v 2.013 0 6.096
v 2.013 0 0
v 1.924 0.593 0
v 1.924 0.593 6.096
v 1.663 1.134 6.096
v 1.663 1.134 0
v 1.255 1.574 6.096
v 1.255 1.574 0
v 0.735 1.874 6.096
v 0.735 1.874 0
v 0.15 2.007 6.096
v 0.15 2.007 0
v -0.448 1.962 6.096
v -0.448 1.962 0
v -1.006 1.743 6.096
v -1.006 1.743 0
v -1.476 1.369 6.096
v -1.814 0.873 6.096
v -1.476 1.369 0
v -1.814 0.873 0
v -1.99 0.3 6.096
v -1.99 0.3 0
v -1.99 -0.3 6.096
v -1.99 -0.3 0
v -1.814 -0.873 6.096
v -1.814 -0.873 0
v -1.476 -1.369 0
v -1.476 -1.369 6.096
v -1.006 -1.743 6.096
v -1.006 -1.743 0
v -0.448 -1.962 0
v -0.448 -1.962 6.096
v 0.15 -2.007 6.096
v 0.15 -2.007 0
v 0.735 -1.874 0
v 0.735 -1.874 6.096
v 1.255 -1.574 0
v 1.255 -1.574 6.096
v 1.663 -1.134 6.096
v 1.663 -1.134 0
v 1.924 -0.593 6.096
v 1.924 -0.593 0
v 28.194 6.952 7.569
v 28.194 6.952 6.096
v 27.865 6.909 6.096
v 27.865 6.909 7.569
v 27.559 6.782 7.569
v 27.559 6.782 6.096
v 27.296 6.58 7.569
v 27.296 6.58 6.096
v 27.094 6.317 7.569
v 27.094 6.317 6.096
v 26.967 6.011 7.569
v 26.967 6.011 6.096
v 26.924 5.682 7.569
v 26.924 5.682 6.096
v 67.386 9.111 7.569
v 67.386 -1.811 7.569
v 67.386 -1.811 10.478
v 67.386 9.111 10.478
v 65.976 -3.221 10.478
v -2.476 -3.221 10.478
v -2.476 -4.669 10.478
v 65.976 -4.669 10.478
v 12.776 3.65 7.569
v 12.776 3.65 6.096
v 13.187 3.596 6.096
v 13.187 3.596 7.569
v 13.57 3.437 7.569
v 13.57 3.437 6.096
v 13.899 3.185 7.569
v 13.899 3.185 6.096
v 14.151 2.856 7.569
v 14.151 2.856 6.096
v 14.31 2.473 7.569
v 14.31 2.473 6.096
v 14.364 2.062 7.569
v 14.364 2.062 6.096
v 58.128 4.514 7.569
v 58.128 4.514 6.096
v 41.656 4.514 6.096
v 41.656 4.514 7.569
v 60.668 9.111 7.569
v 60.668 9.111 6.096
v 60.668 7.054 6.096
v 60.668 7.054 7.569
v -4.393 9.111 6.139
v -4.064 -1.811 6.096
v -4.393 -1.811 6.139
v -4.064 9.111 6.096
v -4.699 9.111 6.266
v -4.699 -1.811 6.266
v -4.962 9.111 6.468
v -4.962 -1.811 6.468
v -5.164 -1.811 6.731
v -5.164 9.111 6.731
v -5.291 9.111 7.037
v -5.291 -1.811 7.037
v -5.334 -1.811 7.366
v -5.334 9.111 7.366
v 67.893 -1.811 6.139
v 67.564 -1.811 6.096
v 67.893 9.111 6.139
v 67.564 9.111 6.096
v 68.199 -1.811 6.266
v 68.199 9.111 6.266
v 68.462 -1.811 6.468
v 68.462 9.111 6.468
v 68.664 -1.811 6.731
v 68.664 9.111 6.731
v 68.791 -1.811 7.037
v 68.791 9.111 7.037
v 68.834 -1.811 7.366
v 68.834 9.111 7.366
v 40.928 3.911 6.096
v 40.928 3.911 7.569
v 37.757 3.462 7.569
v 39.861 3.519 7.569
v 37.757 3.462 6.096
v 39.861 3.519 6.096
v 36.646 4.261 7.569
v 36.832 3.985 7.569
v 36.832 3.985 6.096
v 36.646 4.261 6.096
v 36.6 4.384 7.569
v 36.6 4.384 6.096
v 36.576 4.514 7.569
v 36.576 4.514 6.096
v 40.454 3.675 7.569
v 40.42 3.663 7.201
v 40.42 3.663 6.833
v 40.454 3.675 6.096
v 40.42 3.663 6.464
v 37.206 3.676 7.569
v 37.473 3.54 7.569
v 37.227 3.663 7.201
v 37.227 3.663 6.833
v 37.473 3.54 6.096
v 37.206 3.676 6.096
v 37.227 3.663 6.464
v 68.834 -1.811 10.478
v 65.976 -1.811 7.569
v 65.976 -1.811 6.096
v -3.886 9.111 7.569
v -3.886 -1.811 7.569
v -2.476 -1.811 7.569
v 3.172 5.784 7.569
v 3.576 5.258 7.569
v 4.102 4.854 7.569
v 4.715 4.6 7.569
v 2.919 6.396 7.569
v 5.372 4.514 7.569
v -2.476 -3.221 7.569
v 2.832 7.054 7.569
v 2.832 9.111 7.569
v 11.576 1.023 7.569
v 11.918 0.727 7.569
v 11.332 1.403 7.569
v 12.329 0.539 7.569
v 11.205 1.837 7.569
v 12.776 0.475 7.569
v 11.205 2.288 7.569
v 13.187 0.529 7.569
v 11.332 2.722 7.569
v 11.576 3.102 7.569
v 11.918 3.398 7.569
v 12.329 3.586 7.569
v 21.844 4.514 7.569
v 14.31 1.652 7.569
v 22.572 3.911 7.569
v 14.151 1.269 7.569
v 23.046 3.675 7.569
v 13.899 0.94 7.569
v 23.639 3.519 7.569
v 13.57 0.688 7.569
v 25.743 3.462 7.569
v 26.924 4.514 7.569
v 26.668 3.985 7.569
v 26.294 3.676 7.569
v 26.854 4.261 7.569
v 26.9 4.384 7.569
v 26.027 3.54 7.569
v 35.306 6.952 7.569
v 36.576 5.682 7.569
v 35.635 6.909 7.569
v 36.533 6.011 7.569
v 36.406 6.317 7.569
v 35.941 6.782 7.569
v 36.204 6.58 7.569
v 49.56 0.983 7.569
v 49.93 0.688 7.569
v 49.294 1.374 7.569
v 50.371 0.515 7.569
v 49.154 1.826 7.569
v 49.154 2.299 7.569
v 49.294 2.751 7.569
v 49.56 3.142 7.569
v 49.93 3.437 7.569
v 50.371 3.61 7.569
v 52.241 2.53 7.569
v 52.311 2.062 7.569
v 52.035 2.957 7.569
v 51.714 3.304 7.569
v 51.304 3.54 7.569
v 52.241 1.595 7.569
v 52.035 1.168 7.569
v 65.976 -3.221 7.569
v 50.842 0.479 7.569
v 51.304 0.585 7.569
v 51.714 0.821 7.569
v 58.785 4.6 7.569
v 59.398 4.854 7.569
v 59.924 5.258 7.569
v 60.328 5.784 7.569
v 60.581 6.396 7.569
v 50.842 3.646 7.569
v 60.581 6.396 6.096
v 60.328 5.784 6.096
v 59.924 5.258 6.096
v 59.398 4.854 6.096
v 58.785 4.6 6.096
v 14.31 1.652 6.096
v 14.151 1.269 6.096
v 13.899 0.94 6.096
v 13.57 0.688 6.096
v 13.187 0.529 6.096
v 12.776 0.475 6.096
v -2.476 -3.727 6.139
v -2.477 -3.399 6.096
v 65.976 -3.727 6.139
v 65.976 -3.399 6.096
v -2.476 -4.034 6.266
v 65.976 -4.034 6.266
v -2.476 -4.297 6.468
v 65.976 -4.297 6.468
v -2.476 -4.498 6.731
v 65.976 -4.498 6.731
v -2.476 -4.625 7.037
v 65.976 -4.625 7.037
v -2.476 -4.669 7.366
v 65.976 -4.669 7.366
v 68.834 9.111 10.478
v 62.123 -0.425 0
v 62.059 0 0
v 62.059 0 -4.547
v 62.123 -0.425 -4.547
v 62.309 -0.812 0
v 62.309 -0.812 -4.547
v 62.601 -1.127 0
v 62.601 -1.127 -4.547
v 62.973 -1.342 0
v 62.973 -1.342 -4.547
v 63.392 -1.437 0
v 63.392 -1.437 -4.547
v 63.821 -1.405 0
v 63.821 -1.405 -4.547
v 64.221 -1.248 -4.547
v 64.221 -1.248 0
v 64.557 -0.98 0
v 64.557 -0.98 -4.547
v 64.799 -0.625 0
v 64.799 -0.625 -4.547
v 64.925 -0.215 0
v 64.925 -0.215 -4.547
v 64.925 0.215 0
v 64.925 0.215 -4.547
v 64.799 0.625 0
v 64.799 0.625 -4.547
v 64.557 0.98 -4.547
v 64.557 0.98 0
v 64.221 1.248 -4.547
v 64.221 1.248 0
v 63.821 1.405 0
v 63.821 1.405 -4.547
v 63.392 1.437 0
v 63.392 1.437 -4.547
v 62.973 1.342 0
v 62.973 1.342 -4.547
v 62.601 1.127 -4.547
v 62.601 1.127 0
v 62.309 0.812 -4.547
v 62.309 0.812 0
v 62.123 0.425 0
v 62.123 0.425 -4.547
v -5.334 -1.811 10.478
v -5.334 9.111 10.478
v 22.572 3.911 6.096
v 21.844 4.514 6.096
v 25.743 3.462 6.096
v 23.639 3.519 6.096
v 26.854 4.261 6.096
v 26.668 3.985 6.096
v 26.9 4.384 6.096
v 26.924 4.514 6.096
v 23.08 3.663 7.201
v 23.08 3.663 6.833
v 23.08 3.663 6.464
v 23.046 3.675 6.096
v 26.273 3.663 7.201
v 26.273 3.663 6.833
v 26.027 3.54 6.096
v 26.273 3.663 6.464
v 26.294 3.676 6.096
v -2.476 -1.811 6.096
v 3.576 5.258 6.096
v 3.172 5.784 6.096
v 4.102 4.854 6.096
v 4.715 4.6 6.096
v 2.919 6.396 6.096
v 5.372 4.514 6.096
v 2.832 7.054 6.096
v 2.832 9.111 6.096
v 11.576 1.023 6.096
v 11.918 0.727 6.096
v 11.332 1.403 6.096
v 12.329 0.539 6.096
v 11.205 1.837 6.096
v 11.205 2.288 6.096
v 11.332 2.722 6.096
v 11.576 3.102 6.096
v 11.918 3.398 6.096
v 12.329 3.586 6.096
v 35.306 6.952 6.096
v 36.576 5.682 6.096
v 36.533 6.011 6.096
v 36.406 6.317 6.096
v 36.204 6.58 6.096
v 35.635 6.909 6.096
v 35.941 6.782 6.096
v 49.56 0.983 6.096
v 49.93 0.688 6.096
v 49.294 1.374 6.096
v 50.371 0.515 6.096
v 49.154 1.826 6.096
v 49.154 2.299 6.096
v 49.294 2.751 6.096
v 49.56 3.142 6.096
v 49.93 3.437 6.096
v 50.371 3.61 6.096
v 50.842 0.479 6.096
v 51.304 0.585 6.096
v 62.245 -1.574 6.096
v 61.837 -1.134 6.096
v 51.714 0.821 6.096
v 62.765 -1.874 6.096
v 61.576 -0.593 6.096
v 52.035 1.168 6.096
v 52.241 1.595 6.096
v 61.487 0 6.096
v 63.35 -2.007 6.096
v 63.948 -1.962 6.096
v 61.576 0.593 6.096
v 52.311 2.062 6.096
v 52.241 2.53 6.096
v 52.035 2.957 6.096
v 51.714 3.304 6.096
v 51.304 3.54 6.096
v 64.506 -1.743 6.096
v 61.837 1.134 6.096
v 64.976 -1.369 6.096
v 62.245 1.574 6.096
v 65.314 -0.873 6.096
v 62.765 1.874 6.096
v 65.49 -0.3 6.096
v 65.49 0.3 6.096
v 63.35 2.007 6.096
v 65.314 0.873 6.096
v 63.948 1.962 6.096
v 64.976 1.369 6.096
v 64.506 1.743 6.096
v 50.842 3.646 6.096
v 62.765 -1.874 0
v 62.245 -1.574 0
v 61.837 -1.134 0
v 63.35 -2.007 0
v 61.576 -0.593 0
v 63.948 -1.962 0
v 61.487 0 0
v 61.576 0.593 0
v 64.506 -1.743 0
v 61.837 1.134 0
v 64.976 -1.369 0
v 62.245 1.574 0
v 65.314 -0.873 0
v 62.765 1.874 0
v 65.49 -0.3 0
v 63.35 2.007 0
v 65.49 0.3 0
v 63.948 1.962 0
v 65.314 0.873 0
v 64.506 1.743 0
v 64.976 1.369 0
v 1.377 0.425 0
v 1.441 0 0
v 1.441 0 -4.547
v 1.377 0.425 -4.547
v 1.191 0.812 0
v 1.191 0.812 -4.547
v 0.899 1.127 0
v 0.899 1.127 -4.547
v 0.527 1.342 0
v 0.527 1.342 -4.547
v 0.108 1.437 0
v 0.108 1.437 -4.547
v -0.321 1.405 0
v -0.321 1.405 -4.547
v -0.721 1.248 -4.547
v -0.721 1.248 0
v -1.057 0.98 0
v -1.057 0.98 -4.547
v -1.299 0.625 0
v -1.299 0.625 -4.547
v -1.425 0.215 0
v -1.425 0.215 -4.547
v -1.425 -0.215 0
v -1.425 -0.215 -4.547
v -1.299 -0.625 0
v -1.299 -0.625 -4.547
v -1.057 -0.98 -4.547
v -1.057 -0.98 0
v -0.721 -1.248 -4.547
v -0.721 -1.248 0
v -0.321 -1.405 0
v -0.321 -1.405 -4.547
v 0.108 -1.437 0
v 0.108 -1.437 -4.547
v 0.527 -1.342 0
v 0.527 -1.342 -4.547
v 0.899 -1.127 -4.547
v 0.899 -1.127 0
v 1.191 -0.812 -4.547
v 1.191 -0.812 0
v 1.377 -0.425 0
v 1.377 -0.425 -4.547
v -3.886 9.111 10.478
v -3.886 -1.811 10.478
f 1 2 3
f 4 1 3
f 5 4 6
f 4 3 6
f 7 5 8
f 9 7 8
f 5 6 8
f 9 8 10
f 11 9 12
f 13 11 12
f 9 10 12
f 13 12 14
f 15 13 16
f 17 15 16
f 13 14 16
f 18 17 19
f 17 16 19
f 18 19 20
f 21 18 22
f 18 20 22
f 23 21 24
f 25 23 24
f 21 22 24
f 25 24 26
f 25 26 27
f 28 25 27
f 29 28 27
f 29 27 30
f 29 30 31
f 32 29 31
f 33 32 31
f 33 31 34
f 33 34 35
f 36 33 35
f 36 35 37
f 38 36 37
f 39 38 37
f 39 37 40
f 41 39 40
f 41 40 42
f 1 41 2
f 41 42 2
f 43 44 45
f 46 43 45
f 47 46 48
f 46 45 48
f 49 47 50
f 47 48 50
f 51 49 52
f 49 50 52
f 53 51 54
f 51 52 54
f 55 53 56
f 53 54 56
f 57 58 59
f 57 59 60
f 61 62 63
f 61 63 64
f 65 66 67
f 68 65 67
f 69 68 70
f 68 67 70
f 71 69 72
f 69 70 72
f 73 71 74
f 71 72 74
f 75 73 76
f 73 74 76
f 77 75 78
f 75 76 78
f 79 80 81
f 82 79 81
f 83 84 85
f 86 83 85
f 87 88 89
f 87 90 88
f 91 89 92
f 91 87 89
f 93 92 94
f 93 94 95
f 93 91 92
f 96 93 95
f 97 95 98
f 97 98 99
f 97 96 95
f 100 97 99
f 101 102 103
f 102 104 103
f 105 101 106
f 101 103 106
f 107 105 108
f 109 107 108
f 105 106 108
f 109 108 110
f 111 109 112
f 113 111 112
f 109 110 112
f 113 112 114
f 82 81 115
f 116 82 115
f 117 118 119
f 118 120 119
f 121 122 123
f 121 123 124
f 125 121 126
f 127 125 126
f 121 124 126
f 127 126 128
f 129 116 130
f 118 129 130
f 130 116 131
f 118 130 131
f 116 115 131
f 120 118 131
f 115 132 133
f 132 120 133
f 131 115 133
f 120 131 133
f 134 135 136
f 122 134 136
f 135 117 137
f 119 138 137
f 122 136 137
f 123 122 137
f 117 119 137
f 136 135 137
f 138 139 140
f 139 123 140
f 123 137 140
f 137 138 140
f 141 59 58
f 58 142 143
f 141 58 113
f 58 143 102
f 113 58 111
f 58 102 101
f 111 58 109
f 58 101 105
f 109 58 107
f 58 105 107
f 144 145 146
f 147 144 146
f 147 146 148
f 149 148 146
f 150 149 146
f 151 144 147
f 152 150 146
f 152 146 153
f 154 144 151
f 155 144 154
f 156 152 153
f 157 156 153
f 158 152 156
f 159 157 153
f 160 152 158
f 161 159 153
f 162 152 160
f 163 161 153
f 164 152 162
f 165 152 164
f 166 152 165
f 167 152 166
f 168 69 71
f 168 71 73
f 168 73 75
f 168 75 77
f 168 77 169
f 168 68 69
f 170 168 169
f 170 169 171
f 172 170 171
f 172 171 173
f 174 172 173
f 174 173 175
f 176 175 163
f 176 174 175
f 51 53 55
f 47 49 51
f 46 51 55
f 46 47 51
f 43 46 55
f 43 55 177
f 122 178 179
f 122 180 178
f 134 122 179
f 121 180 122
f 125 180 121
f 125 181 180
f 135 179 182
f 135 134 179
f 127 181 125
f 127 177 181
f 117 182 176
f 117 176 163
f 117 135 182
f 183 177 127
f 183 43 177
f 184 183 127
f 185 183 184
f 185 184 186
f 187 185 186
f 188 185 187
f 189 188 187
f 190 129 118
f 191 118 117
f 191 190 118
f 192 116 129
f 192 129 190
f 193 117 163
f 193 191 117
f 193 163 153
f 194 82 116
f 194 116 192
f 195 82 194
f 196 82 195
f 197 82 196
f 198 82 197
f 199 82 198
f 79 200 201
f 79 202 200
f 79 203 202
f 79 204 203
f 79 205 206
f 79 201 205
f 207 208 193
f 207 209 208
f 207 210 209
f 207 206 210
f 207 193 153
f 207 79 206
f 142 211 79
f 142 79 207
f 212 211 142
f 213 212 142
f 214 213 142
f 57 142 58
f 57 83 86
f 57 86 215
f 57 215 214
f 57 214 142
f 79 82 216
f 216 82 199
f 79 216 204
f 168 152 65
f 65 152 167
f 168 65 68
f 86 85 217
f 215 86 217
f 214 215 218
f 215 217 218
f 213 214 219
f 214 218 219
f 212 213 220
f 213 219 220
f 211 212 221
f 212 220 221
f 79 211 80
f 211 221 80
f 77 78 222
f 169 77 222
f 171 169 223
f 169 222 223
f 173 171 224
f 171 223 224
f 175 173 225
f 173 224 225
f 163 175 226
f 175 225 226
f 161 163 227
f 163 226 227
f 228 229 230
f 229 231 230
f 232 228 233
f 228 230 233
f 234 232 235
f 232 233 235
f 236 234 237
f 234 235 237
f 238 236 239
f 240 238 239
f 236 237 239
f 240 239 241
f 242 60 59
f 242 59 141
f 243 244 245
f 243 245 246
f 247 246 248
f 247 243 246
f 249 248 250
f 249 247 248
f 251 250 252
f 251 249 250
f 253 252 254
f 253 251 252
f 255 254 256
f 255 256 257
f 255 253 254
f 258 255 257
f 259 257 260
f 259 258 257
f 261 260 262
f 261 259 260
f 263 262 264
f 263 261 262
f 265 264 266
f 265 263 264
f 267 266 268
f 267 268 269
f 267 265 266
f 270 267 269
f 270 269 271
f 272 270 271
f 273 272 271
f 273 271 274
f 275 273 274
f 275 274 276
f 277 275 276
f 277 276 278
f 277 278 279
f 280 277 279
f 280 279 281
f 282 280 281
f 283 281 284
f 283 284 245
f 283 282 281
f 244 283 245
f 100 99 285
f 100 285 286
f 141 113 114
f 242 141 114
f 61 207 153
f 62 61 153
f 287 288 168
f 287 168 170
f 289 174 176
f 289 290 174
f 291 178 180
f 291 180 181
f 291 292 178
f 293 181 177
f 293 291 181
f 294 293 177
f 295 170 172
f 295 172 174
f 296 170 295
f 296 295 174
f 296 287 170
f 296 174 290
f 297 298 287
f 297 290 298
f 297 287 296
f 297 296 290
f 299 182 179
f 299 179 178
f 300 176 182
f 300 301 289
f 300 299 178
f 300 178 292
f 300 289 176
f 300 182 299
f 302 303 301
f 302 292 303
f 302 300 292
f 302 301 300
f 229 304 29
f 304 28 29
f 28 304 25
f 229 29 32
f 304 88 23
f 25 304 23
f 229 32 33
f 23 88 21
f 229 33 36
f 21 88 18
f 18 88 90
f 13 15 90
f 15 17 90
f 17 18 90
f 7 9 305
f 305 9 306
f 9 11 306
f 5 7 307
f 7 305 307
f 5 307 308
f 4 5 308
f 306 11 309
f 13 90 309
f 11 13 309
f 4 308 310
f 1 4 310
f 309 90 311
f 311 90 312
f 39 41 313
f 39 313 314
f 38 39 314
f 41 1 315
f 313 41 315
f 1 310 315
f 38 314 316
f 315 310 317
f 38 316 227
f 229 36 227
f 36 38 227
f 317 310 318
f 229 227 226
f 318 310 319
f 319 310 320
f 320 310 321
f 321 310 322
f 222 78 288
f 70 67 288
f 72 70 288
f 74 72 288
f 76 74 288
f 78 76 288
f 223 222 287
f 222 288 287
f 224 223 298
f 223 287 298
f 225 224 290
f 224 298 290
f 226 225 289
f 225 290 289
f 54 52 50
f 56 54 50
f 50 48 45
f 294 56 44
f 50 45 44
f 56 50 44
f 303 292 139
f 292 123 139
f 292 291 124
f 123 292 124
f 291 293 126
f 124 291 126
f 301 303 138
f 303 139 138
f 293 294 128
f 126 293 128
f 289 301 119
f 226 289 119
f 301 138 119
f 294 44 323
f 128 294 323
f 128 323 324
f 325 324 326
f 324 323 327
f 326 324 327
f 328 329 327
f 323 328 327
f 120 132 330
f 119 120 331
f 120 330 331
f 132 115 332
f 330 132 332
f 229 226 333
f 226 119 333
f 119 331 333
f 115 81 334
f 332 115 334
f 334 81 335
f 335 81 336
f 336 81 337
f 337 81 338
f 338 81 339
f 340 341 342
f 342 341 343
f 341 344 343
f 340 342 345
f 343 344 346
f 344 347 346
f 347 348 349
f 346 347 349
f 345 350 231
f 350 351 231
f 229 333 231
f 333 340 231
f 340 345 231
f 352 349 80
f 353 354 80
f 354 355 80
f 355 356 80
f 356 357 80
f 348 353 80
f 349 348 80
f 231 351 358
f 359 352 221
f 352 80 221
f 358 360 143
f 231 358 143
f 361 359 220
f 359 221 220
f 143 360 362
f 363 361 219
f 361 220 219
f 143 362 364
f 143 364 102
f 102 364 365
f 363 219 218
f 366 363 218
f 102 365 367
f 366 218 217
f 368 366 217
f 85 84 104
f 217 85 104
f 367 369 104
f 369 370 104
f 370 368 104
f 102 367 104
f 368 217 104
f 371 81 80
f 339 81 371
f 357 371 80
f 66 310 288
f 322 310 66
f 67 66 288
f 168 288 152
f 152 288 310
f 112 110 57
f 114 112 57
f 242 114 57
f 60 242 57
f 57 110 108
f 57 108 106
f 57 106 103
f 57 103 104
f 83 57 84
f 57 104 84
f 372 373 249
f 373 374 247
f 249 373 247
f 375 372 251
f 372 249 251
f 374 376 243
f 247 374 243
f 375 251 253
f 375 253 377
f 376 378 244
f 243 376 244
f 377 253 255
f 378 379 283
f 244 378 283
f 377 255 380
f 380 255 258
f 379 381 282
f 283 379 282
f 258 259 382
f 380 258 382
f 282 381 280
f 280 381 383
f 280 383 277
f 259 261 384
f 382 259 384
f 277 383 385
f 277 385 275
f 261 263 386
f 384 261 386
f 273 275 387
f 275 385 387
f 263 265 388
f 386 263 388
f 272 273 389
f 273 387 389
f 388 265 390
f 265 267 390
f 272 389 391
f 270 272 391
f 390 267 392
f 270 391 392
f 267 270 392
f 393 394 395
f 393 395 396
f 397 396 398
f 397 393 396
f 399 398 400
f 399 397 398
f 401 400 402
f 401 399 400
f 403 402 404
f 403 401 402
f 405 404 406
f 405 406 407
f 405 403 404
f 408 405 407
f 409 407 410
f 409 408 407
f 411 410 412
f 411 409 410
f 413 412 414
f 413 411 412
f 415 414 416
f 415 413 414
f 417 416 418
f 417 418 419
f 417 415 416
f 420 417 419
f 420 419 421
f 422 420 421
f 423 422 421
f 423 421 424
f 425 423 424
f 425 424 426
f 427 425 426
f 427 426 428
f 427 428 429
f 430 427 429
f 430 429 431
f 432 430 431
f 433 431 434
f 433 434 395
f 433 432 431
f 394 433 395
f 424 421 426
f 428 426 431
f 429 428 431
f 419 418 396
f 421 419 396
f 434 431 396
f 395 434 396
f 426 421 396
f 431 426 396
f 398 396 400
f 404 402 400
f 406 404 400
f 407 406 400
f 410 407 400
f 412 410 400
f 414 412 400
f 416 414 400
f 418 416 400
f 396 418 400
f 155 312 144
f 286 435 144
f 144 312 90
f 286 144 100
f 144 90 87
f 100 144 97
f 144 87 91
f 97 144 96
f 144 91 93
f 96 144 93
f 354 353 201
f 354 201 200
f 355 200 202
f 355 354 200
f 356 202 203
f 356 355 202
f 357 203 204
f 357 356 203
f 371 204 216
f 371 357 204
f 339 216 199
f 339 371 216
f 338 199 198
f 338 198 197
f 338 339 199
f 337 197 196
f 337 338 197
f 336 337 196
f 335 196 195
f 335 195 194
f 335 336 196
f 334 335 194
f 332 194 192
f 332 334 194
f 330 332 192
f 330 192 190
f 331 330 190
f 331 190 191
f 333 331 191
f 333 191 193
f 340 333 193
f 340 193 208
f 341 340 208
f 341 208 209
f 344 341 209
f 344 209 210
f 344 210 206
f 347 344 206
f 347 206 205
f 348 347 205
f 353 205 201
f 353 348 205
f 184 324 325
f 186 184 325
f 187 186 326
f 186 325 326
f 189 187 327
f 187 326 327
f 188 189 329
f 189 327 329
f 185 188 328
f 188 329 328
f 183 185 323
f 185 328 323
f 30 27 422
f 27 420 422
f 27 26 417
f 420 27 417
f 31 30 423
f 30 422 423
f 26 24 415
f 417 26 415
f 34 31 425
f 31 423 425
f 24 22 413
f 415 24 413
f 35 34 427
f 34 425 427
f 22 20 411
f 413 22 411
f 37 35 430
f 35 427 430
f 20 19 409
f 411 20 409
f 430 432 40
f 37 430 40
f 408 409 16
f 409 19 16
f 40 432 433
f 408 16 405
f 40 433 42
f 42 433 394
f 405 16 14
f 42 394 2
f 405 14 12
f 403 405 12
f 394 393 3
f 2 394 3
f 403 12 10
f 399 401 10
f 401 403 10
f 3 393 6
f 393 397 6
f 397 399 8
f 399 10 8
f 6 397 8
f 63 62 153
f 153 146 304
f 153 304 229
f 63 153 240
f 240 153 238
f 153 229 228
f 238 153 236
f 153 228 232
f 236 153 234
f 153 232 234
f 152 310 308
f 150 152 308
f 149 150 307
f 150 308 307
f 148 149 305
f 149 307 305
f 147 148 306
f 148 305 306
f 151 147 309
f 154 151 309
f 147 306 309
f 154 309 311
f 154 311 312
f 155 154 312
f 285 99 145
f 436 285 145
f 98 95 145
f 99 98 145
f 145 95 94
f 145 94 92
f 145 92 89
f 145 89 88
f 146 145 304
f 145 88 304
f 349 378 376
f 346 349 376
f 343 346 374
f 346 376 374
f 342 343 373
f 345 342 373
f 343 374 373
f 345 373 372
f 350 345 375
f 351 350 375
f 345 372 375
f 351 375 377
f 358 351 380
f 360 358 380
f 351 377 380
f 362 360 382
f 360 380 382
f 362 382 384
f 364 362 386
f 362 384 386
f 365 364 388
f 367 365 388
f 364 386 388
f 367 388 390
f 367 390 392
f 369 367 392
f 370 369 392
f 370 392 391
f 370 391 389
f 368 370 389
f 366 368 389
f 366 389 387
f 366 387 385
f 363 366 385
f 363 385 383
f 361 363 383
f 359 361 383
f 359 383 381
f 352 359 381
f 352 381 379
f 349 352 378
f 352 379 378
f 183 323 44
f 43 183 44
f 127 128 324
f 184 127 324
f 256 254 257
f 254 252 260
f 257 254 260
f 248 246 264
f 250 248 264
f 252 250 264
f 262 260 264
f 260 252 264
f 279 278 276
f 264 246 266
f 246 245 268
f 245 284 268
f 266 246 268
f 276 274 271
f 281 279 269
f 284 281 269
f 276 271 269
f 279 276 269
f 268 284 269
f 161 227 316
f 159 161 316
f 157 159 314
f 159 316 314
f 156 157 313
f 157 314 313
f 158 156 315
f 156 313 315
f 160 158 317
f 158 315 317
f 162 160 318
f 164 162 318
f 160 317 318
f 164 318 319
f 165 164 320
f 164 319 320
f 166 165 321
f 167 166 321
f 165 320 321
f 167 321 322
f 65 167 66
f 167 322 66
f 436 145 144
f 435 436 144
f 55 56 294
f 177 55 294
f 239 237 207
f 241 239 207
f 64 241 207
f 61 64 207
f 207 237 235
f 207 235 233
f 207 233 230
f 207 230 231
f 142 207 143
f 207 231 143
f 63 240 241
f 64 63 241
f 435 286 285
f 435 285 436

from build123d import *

# Parameters (mm, degrees)
F0_R     = 2.01295
F0_R_2   = 1.44145
F1_DEPTH = 6.096
F2_DEPTH = 4.5466
F3_R     = 1.5875
F3_W     = 53.2003
F3_H     = 1.4478
F3_W_2   = 12.7762
F3_W_3   = 1.4478
F3_H_2   = 10.922
F3_W_4   = 2.4765
F4_DEPTH = 1.4732
F5_DEPTH = 4.3815
F6_R     = 1.27


with BuildPart() as f1:
    # F0 (on Top) → F1 (new body)
    with BuildSketch(Plane.XY):
        Circle(F0_R)
        Circle(F0_R_2, mode=Mode.SUBTRACT)
        Circle(F0_R_2)
    extrude(amount=F1_DEPTH)

    # F0 (on Top) → F2, piece 2 (join)
    with BuildSketch(Plane.XY):
        Circle(F0_R_2)
    extrude(amount=-F2_DEPTH)



with BuildPart() as f1b:
    # F0 (on Top) → F1, piece 2 (new body)
    with BuildSketch(Plane.XY):
        with BuildLine():
            ThreePointArc((65.51295, 0), (63.5, 2.01295), (61.48705, 0))
            ThreePointArc((61.48705, 0), (63.5, -2.01295), (65.51295, 0))
        make_face()
        with BuildLine():
            ThreePointArc((64.94145, 0), (63.5, -1.44145), (62.05855, 0))
            ThreePointArc((62.05855, 0), (63.5, 1.44145), (64.94145, 0))
        make_face(mode=Mode.SUBTRACT)
        with BuildLine():
            ThreePointArc((64.94145, 0), (63.5, 1.44145), (62.05855, 0))
            ThreePointArc((62.05855, 0), (63.5, -1.44145), (64.94145, 0))
        make_face()
    extrude(amount=F1_DEPTH)

    # F0 (on Top) → F2 (join)
    with BuildSketch(Plane.XY):
        with BuildLine():
            ThreePointArc((64.94145, 0), (63.5, 1.44145), (62.05855, 0))
            ThreePointArc((62.05855, 0), (63.5, -1.44145), (64.94145, 0))
        make_face()
    extrude(amount=-F2_DEPTH)


with BuildPart() as f1_1:
    add(f1.part)

    add(f1b.part)  # F4 merges F1b
    # F3 (on face) → F4 (join)
    with BuildSketch(Plane.XY.offset(6.096)):
        with BuildLine():
            Line((12.7762, -3.22072), (65.9765, -3.22072))
            Line((65.9765, -3.22072), (65.9765, -1.81102))
            Line((65.9765, -1.81102), (67.3862, -1.81102))
            Line((67.3862, -1.81102), (67.3862, 9.11098))
            Line((67.3862, 9.11098), (60.6679, 9.11098))
            Line((60.6679, 9.11098), (60.6679, 7.05358))
            ThreePointArc((60.6679, 7.05358), (59.9239512242, 5.2575287758), (58.1279, 4.51358))
            Line((58.1279, 4.51358), (48.4759, 4.51358))
            Line((48.4759, 4.51358), (41.656, 4.51358))
            add(Edge.make_bspline(
                [(41.656, 4.51358), (41.2915210924, 4.1758145401), (40.5551891723, 3.4567511883), (38.111648117, 3.3607328563), (37.2421413327, 3.55540528), (36.6106444724, 4.1422323132), (36.576, 4.51358)],
                knots=[0, 0, 0, 0, 0.2581839456, 0.5779890319, 0.781834691, 1, 1, 1, 1], degree=3))
            Line((36.576, 4.51358), (36.576, 5.68198))
            ThreePointArc((36.576, 5.68198), (36.2040256121, 6.5800056121), (35.306, 6.95198))
            Line((35.306, 6.95198), (31.75, 6.95198))
            Line((31.75, 6.95198), (28.194, 6.95198))
            ThreePointArc((28.194, 6.95198), (27.2959743879, 6.5800056121), (26.924, 5.68198))
            Line((26.924, 5.68198), (26.924, 4.51358))
            add(Edge.make_bspline(
                [(21.844, 4.51358), (22.2084789076, 4.1758145401), (22.9448108277, 3.4567511883), (25.388351883, 3.3607328563), (26.2578586673, 3.55540528), (26.8893555276, 4.1422323132), (26.924, 4.51358)],
                knots=[0, 0, 0, 0, 0.2581839456, 0.5779890319, 0.781834691, 1, 1, 1, 1], degree=3))
            Line((21.844, 4.51358), (12.7762, 4.51358))
            Line((12.7762, 4.51358), (12.7762, 3.64998))
            ThreePointArc((12.7762, 3.64998), (13.8987320151, 3.1850120151), (14.3637, 2.06248))
            ThreePointArc((14.3637, 2.06248), (13.8987320151, 0.9399479849), (12.7762, 0.47498))
            Line((12.7762, 0.47498), (12.7762, -3.22072))
        make_face()
        with Locations((50.7238, 2.06248)):
            Circle(F3_R, mode=Mode.SUBTRACT)
        with BuildLine():
            Line((0, -3.22072), (12.7762, -3.22072))
            Line((12.7762, -3.22072), (12.7762, 0.47498))
            ThreePointArc((12.7762, 0.47498), (11.1887, 2.06248), (12.7762, 3.64998))
            Line((12.7762, 3.64998), (12.7762, 4.51358))
            Line((12.7762, 4.51358), (5.3721, 4.51358))
            ThreePointArc((5.3721, 4.51358), (3.5760487758, 5.2575287758), (2.8321, 7.05358))
            Line((2.8321, 7.05358), (2.8321, 9.11098))
            Line((2.8321, 9.11098), (-3.8862, 9.11098))
            Line((-3.8862, 9.11098), (-3.8862, -1.81102))
            Line((-3.8862, -1.81102), (-2.4765, -1.81102))
            Line((-2.4765, -1.81102), (-2.4765, -3.22072))
            Line((-2.4765, -3.22072), (0, -3.22072))
        make_face()
        with BuildLine():
            ThreePointArc((2.01295, 0), (1.4233705952, -1.4233705952), (0, -2.01295))
            ThreePointArc((0, -2.01295), (-1.4233705952, 1.4233705952), (2.01295, 0))
        make_face(mode=Mode.SUBTRACT)
        with Locations((39.37635, -3.94462)):
            Rectangle(F3_W, F3_H)
        with Locations((6.3881, -3.94462)):
            Rectangle(F3_W_2, F3_H)
        with Locations((68.1101, 3.64998)):
            Rectangle(F3_W_3, F3_H_2)
        with Locations((-4.6101, 3.64998)):
            Rectangle(F3_W_3, F3_H_2)
        with BuildLine():
            ThreePointArc((2.01295, 0), (-1.4233705952, 1.4233705952), (0, -2.01295))
            ThreePointArc((0, -2.01295), (1.4233705952, -1.4233705952), (2.01295, 0))
        make_face()
        with Locations((-1.23825, -3.94462)):
            Rectangle(F3_W_4, F3_H)
    extrude(amount=F4_DEPTH)

    # F3 (on face) → F5 (join)
    with BuildSketch(Plane.XY.offset(6.096)):
        with Locations((-4.6101, 3.64998)):
            Rectangle(F3_W_3, F3_H_2)
        with Locations((6.3881, -3.94462)):
            Rectangle(F3_W_2, F3_H)
        with Locations((39.37635, -3.94462)):
            Rectangle(F3_W, F3_H)
        with Locations((68.1101, 3.64998)):
            Rectangle(F3_W_3, F3_H_2)
        with Locations((-1.23825, -3.94462)):
            Rectangle(F3_W_4, F3_H)
    extrude(amount=F5_DEPTH)

    # F6
    f6_edges = [f1_1.edges().sort_by_distance(p)[0] for p in [
        (-5.334, 3.64998, 6.096),
        (31.75, -4.66852, 6.096),
        (68.834, 3.64998, 6.096),
    ]]
    fillet(f6_edges, radius=F6_R)


solid = f1_1.part
